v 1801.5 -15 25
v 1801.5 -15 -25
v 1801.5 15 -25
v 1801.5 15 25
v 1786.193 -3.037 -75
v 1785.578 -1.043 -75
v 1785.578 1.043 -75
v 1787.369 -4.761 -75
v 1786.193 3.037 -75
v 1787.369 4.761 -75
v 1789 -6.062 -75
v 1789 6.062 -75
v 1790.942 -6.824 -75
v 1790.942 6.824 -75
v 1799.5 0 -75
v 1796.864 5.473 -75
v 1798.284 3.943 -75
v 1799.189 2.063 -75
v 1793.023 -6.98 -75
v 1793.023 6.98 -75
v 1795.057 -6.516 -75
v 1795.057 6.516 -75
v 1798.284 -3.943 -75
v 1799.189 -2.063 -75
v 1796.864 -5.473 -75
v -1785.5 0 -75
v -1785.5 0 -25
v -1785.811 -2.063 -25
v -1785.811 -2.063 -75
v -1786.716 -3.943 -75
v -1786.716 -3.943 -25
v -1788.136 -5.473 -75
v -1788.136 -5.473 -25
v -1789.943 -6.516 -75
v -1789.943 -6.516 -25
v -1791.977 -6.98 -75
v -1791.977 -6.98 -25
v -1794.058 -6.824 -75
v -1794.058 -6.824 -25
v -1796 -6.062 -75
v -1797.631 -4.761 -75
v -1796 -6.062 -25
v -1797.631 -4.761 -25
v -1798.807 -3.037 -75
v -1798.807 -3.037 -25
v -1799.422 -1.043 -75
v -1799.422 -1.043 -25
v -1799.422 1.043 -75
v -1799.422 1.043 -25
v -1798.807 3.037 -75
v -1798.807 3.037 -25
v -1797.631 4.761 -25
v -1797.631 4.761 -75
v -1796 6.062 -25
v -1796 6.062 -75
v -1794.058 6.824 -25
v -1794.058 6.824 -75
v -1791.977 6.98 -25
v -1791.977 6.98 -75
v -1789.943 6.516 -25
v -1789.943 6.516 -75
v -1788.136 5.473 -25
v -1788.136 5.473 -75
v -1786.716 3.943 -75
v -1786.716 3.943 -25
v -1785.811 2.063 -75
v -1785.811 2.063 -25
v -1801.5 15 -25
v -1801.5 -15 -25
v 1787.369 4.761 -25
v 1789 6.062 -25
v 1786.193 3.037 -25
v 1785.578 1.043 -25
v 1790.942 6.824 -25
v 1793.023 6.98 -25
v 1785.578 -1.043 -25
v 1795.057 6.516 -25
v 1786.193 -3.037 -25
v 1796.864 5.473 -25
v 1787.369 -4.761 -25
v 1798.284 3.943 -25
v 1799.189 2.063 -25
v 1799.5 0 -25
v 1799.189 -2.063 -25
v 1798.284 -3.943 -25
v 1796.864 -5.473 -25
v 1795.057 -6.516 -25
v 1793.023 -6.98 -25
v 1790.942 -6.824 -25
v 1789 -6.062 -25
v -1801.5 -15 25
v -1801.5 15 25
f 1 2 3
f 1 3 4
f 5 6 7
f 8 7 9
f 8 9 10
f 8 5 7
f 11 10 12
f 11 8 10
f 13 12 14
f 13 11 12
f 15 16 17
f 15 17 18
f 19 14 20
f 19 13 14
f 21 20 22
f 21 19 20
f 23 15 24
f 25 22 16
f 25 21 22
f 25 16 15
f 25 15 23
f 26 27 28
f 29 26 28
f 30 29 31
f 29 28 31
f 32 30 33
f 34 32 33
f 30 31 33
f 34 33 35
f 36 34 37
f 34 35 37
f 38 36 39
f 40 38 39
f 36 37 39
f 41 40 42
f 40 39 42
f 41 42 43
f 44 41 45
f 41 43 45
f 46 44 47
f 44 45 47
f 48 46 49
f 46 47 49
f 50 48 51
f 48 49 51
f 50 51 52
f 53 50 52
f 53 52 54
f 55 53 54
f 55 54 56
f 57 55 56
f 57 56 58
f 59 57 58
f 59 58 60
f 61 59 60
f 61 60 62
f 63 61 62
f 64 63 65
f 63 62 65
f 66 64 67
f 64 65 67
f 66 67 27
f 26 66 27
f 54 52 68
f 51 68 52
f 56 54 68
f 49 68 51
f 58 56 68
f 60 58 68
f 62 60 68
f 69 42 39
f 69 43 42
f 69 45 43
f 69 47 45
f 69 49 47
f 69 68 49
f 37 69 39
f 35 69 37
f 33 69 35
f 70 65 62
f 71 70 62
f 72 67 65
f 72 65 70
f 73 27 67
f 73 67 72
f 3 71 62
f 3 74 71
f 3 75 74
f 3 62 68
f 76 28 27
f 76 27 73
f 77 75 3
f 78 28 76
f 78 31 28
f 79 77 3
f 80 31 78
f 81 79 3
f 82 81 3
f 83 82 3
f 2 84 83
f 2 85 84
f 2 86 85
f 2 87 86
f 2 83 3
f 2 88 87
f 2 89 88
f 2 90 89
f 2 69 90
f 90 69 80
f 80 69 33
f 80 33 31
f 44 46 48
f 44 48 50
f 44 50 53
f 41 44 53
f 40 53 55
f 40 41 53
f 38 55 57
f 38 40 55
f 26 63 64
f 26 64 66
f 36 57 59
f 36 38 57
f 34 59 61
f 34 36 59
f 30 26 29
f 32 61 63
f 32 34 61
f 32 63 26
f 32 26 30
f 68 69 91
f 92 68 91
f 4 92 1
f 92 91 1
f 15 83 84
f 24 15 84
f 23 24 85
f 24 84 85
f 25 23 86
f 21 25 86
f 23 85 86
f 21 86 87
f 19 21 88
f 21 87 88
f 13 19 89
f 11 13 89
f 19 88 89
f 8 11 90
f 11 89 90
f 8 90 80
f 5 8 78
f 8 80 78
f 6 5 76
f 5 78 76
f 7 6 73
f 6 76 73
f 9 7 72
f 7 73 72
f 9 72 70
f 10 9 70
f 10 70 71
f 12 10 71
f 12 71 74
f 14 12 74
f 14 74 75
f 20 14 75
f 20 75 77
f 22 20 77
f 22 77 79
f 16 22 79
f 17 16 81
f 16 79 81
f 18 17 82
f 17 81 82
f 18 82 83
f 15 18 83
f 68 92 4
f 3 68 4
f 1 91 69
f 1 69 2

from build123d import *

# Parameters (mm, degrees)
F0_W          = 3603
F0_H          = 50
F1_DEPTH      = 15
F1_DEPTH_BACK = 15
F3_DEPTH      = 50
F4_R          = 7
F5_DEPTH      = 50


with BuildPart() as f1:
    # F0 (on Front) → F1 (new body, two sides)
    with BuildSketch(Plane.XZ) as f1_sk:
        Rectangle(F0_W, F0_H)
    extrude(amount=F1_DEPTH)
    extrude(f1_sk.sketch, amount=-F1_DEPTH_BACK)

    # F2 (on face) → F3 (join)
    with BuildSketch(Plane(origin=(0, 0, -25), x_dir=(1, 0, 0), z_dir=(0, 0, -1))):
        with BuildLine():
            ThreePointArc((-1799.5, 0), (-1792.5, -7), (-1785.5, 0))
            ThreePointArc((-1785.5, 0), (-1792.5, 7), (-1799.5, 0))
        make_face()
    extrude(amount=F3_DEPTH)

    # F4 (on face) → F5 (join)
    with BuildSketch(Plane(origin=(0, 0, -25), x_dir=(1, 0, 0), z_dir=(0, 0, -1))):
        with Locations((1792.5, 0)):
            Circle(F4_R)
    extrude(amount=F5_DEPTH)


solid = f1.part
